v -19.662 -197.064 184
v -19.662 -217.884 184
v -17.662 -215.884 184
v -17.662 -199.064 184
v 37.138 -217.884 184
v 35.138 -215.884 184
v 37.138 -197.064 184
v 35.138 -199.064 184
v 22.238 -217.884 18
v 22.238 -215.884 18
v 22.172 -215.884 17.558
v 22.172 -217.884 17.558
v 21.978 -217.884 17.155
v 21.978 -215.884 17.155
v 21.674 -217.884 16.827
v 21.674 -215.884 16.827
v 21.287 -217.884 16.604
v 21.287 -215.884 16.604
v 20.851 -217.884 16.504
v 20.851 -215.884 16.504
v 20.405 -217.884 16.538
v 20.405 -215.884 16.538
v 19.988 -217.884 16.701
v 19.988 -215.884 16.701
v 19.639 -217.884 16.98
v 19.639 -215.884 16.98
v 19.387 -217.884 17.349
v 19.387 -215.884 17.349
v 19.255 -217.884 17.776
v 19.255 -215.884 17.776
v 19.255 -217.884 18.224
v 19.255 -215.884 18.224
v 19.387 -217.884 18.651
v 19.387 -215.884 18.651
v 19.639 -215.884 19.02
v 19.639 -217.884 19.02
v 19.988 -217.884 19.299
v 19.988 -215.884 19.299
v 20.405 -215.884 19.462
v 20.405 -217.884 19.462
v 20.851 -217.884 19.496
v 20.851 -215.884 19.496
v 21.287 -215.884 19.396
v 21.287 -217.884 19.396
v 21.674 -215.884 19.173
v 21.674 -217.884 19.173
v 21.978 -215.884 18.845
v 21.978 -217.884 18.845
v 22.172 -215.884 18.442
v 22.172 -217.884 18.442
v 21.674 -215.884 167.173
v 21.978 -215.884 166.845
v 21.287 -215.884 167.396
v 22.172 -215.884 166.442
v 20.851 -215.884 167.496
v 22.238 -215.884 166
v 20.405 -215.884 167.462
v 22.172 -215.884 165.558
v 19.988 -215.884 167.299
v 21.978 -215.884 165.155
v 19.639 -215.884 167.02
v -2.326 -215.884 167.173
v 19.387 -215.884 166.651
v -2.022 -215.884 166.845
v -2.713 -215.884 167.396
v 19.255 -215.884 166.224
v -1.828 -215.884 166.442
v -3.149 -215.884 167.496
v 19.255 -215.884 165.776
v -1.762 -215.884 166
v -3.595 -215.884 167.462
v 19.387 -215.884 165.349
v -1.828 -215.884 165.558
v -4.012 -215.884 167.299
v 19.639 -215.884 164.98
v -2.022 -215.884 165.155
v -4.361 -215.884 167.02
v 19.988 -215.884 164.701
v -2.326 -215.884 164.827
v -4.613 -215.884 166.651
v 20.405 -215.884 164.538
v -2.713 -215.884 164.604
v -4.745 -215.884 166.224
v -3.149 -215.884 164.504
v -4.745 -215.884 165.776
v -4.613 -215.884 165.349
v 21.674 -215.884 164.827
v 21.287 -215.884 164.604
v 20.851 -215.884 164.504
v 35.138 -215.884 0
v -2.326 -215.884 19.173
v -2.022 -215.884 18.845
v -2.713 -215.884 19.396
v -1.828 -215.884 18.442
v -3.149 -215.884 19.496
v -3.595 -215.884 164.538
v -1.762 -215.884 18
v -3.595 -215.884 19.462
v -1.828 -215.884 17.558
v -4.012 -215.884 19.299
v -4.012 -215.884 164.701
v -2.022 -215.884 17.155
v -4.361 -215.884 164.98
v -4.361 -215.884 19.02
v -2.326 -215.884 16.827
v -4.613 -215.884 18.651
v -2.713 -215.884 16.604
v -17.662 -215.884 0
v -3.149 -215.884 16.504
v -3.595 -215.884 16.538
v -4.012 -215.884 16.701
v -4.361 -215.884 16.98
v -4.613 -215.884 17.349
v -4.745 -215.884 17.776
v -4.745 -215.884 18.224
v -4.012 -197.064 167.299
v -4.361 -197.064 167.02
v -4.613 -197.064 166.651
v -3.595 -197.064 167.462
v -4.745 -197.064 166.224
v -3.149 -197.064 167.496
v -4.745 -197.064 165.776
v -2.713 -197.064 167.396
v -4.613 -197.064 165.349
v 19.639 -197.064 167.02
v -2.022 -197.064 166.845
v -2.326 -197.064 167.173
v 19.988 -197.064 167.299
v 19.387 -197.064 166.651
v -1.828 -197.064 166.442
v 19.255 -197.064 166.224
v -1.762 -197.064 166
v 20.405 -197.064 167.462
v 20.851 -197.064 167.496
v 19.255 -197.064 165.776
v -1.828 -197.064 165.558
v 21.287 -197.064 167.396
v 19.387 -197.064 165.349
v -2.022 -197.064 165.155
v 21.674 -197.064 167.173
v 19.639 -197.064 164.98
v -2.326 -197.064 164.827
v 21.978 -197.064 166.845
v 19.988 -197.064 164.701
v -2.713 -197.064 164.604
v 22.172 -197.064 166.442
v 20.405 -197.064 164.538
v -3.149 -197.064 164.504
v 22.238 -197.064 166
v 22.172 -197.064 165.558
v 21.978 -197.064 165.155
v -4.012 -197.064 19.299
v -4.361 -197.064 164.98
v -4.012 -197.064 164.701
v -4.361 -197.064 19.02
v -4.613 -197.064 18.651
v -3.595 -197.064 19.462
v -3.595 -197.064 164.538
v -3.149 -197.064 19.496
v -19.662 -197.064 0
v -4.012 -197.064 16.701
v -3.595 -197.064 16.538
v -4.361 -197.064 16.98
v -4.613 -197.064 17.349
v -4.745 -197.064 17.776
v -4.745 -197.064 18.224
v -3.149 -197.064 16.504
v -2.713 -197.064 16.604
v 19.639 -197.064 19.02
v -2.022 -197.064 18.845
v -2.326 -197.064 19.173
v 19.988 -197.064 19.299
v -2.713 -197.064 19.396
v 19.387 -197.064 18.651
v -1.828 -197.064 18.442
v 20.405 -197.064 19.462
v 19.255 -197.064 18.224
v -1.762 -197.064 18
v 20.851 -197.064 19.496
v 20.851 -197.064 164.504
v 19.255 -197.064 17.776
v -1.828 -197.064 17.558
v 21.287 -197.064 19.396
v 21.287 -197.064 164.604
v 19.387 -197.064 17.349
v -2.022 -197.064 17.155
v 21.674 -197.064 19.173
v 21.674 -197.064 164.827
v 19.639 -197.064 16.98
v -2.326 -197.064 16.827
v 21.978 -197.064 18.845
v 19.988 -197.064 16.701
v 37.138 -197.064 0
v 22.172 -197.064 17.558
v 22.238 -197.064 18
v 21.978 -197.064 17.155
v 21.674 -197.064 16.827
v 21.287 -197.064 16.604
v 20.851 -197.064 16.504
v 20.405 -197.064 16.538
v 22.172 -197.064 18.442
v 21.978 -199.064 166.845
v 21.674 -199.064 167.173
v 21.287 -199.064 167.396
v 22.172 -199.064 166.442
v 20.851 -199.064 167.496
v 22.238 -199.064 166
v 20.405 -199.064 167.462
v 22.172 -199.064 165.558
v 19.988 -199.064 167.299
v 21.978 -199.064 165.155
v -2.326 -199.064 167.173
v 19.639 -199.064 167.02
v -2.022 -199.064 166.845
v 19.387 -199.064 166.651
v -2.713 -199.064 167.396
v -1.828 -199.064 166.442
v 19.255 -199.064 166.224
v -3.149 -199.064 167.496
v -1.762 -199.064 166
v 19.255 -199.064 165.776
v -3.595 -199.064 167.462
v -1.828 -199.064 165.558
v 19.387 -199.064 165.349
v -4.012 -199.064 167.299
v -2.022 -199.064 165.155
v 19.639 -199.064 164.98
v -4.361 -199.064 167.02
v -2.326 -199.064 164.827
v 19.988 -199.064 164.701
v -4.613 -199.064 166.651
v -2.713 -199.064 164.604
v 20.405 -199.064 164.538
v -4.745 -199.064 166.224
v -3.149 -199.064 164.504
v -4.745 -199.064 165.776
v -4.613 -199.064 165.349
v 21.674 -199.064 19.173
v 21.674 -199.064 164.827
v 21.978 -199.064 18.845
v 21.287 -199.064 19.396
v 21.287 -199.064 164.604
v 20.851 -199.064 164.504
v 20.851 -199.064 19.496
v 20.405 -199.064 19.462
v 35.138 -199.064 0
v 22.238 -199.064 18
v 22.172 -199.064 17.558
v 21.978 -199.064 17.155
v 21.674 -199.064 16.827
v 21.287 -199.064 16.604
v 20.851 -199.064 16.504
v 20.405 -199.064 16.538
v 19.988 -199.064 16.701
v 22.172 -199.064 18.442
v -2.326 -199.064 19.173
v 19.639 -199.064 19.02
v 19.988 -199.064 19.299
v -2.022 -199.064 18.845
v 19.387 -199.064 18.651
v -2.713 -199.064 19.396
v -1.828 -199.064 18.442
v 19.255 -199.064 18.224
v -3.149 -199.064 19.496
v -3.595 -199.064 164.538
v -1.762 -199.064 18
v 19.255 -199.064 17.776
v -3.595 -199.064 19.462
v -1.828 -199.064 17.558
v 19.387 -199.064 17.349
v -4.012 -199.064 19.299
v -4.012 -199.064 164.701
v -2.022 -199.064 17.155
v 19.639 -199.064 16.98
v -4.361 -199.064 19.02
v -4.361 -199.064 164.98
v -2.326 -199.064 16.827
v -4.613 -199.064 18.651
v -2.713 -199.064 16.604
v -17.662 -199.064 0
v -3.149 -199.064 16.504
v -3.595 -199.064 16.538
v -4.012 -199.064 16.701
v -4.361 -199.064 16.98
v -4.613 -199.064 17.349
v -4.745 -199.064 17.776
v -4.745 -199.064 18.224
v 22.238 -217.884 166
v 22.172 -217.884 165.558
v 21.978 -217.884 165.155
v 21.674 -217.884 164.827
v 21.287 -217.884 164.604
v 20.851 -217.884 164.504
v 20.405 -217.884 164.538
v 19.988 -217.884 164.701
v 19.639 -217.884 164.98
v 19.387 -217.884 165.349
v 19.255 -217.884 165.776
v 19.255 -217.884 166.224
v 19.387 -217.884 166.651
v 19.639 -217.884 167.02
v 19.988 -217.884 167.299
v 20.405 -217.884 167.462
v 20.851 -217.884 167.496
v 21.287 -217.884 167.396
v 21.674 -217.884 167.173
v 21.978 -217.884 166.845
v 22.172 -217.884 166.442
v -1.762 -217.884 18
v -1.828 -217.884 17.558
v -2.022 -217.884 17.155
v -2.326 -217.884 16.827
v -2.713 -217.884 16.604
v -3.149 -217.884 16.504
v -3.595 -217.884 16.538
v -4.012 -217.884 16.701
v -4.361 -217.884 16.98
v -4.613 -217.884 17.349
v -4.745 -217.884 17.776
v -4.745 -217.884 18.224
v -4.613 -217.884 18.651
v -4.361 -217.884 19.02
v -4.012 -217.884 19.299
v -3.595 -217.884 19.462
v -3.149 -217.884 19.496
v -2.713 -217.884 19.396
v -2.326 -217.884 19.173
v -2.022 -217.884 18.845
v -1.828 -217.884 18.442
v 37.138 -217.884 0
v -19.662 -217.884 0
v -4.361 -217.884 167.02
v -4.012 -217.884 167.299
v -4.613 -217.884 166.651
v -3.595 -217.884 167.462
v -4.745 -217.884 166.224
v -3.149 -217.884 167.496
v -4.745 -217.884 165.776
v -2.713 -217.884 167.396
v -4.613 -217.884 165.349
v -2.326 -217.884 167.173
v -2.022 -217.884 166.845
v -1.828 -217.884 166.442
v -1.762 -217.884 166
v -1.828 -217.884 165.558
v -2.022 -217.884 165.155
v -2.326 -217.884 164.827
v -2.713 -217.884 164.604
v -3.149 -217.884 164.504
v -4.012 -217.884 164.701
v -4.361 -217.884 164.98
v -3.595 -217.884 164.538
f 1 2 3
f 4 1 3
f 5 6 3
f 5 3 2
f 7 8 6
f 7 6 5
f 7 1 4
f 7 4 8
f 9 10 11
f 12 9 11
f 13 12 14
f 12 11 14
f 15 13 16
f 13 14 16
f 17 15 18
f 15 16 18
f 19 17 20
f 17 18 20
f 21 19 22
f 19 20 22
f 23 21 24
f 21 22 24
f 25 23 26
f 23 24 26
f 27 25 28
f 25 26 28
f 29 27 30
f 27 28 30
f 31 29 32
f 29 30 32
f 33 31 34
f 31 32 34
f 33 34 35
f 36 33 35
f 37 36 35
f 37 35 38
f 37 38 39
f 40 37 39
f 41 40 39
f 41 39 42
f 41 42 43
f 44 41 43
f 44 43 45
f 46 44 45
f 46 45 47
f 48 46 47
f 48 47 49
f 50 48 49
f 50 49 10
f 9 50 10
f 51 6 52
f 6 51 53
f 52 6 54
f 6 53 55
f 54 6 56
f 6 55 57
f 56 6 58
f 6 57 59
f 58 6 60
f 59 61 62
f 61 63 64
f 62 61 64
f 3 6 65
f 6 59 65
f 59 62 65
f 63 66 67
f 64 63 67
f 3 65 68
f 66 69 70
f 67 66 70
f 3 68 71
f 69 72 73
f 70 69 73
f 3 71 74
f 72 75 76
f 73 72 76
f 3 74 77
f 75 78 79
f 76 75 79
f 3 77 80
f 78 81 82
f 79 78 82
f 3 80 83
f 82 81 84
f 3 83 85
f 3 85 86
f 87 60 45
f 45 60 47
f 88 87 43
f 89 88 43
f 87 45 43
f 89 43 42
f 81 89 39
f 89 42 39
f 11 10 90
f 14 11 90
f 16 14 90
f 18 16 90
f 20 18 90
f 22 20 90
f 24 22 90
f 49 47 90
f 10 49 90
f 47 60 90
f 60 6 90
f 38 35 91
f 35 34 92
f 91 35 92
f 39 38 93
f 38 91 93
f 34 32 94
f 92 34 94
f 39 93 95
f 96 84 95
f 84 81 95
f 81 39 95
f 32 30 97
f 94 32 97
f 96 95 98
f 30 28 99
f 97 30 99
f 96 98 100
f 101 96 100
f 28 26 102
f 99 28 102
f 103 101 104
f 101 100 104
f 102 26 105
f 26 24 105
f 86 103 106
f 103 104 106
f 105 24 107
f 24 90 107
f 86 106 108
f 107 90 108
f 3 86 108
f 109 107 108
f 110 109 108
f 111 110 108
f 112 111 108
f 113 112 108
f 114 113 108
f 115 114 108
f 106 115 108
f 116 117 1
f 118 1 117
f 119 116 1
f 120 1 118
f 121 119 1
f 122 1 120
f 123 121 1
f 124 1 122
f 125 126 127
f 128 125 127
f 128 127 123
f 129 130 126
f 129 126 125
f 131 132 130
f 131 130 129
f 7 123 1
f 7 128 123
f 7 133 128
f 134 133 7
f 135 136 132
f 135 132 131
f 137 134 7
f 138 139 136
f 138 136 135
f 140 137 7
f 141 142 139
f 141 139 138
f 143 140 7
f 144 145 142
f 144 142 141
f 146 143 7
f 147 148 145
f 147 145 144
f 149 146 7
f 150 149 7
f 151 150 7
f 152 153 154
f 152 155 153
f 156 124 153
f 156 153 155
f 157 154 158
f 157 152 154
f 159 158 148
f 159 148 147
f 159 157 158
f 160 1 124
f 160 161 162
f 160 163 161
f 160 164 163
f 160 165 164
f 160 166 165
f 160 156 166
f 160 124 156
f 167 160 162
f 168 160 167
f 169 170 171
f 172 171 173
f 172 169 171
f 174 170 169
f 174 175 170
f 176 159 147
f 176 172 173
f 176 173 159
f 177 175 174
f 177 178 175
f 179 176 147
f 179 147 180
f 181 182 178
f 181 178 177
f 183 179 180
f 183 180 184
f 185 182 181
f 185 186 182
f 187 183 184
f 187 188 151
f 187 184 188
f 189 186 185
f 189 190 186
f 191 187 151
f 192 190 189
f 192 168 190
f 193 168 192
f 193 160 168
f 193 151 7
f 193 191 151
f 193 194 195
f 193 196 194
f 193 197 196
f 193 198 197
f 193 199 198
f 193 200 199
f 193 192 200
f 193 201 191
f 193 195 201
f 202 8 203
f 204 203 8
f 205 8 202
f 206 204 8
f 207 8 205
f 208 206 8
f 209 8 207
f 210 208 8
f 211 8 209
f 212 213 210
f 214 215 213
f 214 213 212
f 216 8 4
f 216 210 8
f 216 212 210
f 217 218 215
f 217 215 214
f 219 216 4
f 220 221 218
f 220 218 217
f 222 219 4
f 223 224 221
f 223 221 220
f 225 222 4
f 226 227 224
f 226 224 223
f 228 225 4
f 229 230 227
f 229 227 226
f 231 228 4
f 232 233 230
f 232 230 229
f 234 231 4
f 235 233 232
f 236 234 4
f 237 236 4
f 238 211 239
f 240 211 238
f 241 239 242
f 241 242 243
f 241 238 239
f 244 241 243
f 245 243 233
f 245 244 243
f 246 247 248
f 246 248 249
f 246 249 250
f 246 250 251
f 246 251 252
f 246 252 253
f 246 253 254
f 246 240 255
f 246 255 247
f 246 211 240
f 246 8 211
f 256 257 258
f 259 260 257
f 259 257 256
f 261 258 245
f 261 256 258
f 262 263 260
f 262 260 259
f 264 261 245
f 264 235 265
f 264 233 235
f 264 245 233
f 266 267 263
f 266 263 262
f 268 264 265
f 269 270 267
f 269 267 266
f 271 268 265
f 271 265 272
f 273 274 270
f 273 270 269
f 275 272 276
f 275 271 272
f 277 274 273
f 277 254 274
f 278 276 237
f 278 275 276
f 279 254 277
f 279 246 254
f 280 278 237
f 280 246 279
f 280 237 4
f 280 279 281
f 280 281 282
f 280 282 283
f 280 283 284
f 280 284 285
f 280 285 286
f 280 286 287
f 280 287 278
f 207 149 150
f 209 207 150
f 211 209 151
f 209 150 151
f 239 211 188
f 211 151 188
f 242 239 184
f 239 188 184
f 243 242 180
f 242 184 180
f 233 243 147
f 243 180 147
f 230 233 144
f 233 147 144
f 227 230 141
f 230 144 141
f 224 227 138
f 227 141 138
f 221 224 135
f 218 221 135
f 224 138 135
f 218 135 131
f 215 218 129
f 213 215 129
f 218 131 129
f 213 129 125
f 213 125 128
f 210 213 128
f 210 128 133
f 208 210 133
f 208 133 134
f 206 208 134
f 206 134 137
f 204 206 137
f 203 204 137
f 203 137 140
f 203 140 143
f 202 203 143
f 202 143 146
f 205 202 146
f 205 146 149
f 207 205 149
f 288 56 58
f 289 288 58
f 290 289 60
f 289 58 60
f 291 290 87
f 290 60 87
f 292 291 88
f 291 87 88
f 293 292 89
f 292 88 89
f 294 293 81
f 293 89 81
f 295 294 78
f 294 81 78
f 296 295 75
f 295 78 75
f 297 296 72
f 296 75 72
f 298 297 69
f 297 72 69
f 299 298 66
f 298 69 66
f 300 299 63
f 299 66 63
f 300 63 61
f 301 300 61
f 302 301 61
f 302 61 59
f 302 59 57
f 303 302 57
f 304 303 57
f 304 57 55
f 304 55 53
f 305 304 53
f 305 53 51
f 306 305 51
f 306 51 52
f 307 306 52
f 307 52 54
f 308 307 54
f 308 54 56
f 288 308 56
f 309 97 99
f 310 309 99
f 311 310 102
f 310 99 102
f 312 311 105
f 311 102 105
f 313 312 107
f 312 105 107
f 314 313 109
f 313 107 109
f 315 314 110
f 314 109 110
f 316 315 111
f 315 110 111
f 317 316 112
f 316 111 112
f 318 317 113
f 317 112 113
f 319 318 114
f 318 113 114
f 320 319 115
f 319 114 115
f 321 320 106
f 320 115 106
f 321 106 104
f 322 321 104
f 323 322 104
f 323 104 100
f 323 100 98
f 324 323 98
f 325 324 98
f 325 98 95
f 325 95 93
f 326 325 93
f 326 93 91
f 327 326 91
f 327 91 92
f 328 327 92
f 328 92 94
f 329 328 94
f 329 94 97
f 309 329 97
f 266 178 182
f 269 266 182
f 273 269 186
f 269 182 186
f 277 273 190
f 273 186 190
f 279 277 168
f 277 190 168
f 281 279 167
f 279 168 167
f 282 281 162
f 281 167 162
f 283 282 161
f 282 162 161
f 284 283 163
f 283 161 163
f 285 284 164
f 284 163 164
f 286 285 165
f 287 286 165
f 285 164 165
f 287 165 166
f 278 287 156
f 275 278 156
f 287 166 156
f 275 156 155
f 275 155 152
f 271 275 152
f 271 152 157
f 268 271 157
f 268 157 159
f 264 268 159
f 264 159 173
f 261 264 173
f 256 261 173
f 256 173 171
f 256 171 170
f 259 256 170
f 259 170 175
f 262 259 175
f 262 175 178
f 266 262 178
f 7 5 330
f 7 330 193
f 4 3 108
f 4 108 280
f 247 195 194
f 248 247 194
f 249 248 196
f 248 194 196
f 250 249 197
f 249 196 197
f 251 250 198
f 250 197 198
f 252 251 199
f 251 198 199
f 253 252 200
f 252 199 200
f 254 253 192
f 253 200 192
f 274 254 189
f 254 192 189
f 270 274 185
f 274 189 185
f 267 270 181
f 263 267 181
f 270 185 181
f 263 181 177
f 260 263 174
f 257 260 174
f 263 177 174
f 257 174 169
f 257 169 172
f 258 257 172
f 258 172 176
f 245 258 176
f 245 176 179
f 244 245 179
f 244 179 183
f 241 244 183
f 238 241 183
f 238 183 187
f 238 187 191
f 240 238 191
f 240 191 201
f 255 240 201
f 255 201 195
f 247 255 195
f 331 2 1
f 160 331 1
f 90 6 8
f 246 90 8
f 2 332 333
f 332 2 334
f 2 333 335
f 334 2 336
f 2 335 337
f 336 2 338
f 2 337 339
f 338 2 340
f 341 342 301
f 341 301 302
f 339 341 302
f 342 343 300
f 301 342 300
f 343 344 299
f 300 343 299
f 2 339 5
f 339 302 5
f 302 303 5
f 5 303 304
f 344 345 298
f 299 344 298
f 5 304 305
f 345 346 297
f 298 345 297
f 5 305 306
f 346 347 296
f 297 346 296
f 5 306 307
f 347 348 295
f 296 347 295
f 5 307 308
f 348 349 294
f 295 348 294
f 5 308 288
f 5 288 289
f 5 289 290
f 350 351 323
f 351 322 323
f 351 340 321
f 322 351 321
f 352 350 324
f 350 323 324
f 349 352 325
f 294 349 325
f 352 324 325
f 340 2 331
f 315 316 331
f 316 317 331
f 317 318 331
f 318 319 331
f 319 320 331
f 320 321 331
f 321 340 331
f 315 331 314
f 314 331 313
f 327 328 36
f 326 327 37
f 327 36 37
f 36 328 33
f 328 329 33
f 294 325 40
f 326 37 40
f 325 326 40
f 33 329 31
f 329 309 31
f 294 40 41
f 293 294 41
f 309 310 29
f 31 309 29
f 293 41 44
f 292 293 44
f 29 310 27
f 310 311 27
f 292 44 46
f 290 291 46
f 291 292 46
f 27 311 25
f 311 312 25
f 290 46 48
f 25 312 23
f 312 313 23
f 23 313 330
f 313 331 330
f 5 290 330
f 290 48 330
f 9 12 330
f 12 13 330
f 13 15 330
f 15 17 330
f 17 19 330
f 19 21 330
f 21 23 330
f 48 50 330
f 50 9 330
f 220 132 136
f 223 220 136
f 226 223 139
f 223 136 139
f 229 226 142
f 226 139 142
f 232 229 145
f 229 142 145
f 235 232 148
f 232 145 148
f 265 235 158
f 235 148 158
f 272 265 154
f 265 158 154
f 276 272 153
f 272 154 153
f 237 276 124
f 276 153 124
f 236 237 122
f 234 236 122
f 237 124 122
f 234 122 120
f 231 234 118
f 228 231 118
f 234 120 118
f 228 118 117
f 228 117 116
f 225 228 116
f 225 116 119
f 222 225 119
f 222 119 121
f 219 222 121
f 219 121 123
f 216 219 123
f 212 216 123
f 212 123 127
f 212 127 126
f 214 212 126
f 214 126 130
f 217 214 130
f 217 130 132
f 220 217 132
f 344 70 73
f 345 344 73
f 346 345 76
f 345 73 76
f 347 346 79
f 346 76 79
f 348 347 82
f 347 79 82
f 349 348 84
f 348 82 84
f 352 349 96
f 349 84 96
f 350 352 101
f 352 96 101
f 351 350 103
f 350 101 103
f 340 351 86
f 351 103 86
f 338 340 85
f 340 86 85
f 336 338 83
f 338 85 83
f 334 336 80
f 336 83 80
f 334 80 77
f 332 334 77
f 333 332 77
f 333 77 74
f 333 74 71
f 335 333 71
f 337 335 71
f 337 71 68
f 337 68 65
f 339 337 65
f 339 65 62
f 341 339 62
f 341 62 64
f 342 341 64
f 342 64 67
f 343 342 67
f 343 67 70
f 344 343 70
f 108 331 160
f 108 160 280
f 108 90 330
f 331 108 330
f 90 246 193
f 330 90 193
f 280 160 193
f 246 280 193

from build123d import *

# Parameters (mm, degrees)
CROQUIS1_W              = 56.8
CROQUIS1_H              = 20.82
SALIENTE_EXTRUIR1_DEPTH = 184
CROQUIS5_W              = 52.8
CROQUIS5_H              = 16.82
CORTAR_EXTRUIR5_DEPTH   = 184
CROQUIS6_R              = 1.5
CORTAR_EXTRUIR6_DEPTH   = 26


with BuildPart() as part:
    # Croquis1 → Saliente-Extruir1 (new body)
    with BuildSketch(Plane.XY):
        with Locations((8.738488477, -207.47377213)):
            Rectangle(CROQUIS1_W, CROQUIS1_H)
    extrude(amount=SALIENTE_EXTRUIR1_DEPTH)

    # Croquis5 → Cortar-Extruir5 (cut)
    with BuildSketch(Plane(origin=(0, 0, 0), x_dir=(-1, 0, 0), z_dir=(0, 0, -1))):
        with Locations((-8.738488477, -207.47377213)):
            Rectangle(CROQUIS5_W, CROQUIS5_H)
    extrude(amount=-CORTAR_EXTRUIR5_DEPTH, mode=Mode.SUBTRACT)

    # Croquis6 → Cortar-Extruir6 (cut)
    with BuildSketch(Plane(origin=(0, -197.06377213, 0), x_dir=(1, 0, 0), z_dir=(0, 1, 0))):
        with Locations((-3.261511523, -18)):
            Circle(CROQUIS6_R)
        with Locations((20.738488477, -18)):
            Circle(CROQUIS6_R)
        with Locations((-3.261511523, -166)):
            Circle(CROQUIS6_R)
        with Locations((20.738488477, -166)):
            Circle(CROQUIS6_R)
    extrude(amount=-CORTAR_EXTRUIR6_DEPTH, mode=Mode.SUBTRACT)


solid = part.part
